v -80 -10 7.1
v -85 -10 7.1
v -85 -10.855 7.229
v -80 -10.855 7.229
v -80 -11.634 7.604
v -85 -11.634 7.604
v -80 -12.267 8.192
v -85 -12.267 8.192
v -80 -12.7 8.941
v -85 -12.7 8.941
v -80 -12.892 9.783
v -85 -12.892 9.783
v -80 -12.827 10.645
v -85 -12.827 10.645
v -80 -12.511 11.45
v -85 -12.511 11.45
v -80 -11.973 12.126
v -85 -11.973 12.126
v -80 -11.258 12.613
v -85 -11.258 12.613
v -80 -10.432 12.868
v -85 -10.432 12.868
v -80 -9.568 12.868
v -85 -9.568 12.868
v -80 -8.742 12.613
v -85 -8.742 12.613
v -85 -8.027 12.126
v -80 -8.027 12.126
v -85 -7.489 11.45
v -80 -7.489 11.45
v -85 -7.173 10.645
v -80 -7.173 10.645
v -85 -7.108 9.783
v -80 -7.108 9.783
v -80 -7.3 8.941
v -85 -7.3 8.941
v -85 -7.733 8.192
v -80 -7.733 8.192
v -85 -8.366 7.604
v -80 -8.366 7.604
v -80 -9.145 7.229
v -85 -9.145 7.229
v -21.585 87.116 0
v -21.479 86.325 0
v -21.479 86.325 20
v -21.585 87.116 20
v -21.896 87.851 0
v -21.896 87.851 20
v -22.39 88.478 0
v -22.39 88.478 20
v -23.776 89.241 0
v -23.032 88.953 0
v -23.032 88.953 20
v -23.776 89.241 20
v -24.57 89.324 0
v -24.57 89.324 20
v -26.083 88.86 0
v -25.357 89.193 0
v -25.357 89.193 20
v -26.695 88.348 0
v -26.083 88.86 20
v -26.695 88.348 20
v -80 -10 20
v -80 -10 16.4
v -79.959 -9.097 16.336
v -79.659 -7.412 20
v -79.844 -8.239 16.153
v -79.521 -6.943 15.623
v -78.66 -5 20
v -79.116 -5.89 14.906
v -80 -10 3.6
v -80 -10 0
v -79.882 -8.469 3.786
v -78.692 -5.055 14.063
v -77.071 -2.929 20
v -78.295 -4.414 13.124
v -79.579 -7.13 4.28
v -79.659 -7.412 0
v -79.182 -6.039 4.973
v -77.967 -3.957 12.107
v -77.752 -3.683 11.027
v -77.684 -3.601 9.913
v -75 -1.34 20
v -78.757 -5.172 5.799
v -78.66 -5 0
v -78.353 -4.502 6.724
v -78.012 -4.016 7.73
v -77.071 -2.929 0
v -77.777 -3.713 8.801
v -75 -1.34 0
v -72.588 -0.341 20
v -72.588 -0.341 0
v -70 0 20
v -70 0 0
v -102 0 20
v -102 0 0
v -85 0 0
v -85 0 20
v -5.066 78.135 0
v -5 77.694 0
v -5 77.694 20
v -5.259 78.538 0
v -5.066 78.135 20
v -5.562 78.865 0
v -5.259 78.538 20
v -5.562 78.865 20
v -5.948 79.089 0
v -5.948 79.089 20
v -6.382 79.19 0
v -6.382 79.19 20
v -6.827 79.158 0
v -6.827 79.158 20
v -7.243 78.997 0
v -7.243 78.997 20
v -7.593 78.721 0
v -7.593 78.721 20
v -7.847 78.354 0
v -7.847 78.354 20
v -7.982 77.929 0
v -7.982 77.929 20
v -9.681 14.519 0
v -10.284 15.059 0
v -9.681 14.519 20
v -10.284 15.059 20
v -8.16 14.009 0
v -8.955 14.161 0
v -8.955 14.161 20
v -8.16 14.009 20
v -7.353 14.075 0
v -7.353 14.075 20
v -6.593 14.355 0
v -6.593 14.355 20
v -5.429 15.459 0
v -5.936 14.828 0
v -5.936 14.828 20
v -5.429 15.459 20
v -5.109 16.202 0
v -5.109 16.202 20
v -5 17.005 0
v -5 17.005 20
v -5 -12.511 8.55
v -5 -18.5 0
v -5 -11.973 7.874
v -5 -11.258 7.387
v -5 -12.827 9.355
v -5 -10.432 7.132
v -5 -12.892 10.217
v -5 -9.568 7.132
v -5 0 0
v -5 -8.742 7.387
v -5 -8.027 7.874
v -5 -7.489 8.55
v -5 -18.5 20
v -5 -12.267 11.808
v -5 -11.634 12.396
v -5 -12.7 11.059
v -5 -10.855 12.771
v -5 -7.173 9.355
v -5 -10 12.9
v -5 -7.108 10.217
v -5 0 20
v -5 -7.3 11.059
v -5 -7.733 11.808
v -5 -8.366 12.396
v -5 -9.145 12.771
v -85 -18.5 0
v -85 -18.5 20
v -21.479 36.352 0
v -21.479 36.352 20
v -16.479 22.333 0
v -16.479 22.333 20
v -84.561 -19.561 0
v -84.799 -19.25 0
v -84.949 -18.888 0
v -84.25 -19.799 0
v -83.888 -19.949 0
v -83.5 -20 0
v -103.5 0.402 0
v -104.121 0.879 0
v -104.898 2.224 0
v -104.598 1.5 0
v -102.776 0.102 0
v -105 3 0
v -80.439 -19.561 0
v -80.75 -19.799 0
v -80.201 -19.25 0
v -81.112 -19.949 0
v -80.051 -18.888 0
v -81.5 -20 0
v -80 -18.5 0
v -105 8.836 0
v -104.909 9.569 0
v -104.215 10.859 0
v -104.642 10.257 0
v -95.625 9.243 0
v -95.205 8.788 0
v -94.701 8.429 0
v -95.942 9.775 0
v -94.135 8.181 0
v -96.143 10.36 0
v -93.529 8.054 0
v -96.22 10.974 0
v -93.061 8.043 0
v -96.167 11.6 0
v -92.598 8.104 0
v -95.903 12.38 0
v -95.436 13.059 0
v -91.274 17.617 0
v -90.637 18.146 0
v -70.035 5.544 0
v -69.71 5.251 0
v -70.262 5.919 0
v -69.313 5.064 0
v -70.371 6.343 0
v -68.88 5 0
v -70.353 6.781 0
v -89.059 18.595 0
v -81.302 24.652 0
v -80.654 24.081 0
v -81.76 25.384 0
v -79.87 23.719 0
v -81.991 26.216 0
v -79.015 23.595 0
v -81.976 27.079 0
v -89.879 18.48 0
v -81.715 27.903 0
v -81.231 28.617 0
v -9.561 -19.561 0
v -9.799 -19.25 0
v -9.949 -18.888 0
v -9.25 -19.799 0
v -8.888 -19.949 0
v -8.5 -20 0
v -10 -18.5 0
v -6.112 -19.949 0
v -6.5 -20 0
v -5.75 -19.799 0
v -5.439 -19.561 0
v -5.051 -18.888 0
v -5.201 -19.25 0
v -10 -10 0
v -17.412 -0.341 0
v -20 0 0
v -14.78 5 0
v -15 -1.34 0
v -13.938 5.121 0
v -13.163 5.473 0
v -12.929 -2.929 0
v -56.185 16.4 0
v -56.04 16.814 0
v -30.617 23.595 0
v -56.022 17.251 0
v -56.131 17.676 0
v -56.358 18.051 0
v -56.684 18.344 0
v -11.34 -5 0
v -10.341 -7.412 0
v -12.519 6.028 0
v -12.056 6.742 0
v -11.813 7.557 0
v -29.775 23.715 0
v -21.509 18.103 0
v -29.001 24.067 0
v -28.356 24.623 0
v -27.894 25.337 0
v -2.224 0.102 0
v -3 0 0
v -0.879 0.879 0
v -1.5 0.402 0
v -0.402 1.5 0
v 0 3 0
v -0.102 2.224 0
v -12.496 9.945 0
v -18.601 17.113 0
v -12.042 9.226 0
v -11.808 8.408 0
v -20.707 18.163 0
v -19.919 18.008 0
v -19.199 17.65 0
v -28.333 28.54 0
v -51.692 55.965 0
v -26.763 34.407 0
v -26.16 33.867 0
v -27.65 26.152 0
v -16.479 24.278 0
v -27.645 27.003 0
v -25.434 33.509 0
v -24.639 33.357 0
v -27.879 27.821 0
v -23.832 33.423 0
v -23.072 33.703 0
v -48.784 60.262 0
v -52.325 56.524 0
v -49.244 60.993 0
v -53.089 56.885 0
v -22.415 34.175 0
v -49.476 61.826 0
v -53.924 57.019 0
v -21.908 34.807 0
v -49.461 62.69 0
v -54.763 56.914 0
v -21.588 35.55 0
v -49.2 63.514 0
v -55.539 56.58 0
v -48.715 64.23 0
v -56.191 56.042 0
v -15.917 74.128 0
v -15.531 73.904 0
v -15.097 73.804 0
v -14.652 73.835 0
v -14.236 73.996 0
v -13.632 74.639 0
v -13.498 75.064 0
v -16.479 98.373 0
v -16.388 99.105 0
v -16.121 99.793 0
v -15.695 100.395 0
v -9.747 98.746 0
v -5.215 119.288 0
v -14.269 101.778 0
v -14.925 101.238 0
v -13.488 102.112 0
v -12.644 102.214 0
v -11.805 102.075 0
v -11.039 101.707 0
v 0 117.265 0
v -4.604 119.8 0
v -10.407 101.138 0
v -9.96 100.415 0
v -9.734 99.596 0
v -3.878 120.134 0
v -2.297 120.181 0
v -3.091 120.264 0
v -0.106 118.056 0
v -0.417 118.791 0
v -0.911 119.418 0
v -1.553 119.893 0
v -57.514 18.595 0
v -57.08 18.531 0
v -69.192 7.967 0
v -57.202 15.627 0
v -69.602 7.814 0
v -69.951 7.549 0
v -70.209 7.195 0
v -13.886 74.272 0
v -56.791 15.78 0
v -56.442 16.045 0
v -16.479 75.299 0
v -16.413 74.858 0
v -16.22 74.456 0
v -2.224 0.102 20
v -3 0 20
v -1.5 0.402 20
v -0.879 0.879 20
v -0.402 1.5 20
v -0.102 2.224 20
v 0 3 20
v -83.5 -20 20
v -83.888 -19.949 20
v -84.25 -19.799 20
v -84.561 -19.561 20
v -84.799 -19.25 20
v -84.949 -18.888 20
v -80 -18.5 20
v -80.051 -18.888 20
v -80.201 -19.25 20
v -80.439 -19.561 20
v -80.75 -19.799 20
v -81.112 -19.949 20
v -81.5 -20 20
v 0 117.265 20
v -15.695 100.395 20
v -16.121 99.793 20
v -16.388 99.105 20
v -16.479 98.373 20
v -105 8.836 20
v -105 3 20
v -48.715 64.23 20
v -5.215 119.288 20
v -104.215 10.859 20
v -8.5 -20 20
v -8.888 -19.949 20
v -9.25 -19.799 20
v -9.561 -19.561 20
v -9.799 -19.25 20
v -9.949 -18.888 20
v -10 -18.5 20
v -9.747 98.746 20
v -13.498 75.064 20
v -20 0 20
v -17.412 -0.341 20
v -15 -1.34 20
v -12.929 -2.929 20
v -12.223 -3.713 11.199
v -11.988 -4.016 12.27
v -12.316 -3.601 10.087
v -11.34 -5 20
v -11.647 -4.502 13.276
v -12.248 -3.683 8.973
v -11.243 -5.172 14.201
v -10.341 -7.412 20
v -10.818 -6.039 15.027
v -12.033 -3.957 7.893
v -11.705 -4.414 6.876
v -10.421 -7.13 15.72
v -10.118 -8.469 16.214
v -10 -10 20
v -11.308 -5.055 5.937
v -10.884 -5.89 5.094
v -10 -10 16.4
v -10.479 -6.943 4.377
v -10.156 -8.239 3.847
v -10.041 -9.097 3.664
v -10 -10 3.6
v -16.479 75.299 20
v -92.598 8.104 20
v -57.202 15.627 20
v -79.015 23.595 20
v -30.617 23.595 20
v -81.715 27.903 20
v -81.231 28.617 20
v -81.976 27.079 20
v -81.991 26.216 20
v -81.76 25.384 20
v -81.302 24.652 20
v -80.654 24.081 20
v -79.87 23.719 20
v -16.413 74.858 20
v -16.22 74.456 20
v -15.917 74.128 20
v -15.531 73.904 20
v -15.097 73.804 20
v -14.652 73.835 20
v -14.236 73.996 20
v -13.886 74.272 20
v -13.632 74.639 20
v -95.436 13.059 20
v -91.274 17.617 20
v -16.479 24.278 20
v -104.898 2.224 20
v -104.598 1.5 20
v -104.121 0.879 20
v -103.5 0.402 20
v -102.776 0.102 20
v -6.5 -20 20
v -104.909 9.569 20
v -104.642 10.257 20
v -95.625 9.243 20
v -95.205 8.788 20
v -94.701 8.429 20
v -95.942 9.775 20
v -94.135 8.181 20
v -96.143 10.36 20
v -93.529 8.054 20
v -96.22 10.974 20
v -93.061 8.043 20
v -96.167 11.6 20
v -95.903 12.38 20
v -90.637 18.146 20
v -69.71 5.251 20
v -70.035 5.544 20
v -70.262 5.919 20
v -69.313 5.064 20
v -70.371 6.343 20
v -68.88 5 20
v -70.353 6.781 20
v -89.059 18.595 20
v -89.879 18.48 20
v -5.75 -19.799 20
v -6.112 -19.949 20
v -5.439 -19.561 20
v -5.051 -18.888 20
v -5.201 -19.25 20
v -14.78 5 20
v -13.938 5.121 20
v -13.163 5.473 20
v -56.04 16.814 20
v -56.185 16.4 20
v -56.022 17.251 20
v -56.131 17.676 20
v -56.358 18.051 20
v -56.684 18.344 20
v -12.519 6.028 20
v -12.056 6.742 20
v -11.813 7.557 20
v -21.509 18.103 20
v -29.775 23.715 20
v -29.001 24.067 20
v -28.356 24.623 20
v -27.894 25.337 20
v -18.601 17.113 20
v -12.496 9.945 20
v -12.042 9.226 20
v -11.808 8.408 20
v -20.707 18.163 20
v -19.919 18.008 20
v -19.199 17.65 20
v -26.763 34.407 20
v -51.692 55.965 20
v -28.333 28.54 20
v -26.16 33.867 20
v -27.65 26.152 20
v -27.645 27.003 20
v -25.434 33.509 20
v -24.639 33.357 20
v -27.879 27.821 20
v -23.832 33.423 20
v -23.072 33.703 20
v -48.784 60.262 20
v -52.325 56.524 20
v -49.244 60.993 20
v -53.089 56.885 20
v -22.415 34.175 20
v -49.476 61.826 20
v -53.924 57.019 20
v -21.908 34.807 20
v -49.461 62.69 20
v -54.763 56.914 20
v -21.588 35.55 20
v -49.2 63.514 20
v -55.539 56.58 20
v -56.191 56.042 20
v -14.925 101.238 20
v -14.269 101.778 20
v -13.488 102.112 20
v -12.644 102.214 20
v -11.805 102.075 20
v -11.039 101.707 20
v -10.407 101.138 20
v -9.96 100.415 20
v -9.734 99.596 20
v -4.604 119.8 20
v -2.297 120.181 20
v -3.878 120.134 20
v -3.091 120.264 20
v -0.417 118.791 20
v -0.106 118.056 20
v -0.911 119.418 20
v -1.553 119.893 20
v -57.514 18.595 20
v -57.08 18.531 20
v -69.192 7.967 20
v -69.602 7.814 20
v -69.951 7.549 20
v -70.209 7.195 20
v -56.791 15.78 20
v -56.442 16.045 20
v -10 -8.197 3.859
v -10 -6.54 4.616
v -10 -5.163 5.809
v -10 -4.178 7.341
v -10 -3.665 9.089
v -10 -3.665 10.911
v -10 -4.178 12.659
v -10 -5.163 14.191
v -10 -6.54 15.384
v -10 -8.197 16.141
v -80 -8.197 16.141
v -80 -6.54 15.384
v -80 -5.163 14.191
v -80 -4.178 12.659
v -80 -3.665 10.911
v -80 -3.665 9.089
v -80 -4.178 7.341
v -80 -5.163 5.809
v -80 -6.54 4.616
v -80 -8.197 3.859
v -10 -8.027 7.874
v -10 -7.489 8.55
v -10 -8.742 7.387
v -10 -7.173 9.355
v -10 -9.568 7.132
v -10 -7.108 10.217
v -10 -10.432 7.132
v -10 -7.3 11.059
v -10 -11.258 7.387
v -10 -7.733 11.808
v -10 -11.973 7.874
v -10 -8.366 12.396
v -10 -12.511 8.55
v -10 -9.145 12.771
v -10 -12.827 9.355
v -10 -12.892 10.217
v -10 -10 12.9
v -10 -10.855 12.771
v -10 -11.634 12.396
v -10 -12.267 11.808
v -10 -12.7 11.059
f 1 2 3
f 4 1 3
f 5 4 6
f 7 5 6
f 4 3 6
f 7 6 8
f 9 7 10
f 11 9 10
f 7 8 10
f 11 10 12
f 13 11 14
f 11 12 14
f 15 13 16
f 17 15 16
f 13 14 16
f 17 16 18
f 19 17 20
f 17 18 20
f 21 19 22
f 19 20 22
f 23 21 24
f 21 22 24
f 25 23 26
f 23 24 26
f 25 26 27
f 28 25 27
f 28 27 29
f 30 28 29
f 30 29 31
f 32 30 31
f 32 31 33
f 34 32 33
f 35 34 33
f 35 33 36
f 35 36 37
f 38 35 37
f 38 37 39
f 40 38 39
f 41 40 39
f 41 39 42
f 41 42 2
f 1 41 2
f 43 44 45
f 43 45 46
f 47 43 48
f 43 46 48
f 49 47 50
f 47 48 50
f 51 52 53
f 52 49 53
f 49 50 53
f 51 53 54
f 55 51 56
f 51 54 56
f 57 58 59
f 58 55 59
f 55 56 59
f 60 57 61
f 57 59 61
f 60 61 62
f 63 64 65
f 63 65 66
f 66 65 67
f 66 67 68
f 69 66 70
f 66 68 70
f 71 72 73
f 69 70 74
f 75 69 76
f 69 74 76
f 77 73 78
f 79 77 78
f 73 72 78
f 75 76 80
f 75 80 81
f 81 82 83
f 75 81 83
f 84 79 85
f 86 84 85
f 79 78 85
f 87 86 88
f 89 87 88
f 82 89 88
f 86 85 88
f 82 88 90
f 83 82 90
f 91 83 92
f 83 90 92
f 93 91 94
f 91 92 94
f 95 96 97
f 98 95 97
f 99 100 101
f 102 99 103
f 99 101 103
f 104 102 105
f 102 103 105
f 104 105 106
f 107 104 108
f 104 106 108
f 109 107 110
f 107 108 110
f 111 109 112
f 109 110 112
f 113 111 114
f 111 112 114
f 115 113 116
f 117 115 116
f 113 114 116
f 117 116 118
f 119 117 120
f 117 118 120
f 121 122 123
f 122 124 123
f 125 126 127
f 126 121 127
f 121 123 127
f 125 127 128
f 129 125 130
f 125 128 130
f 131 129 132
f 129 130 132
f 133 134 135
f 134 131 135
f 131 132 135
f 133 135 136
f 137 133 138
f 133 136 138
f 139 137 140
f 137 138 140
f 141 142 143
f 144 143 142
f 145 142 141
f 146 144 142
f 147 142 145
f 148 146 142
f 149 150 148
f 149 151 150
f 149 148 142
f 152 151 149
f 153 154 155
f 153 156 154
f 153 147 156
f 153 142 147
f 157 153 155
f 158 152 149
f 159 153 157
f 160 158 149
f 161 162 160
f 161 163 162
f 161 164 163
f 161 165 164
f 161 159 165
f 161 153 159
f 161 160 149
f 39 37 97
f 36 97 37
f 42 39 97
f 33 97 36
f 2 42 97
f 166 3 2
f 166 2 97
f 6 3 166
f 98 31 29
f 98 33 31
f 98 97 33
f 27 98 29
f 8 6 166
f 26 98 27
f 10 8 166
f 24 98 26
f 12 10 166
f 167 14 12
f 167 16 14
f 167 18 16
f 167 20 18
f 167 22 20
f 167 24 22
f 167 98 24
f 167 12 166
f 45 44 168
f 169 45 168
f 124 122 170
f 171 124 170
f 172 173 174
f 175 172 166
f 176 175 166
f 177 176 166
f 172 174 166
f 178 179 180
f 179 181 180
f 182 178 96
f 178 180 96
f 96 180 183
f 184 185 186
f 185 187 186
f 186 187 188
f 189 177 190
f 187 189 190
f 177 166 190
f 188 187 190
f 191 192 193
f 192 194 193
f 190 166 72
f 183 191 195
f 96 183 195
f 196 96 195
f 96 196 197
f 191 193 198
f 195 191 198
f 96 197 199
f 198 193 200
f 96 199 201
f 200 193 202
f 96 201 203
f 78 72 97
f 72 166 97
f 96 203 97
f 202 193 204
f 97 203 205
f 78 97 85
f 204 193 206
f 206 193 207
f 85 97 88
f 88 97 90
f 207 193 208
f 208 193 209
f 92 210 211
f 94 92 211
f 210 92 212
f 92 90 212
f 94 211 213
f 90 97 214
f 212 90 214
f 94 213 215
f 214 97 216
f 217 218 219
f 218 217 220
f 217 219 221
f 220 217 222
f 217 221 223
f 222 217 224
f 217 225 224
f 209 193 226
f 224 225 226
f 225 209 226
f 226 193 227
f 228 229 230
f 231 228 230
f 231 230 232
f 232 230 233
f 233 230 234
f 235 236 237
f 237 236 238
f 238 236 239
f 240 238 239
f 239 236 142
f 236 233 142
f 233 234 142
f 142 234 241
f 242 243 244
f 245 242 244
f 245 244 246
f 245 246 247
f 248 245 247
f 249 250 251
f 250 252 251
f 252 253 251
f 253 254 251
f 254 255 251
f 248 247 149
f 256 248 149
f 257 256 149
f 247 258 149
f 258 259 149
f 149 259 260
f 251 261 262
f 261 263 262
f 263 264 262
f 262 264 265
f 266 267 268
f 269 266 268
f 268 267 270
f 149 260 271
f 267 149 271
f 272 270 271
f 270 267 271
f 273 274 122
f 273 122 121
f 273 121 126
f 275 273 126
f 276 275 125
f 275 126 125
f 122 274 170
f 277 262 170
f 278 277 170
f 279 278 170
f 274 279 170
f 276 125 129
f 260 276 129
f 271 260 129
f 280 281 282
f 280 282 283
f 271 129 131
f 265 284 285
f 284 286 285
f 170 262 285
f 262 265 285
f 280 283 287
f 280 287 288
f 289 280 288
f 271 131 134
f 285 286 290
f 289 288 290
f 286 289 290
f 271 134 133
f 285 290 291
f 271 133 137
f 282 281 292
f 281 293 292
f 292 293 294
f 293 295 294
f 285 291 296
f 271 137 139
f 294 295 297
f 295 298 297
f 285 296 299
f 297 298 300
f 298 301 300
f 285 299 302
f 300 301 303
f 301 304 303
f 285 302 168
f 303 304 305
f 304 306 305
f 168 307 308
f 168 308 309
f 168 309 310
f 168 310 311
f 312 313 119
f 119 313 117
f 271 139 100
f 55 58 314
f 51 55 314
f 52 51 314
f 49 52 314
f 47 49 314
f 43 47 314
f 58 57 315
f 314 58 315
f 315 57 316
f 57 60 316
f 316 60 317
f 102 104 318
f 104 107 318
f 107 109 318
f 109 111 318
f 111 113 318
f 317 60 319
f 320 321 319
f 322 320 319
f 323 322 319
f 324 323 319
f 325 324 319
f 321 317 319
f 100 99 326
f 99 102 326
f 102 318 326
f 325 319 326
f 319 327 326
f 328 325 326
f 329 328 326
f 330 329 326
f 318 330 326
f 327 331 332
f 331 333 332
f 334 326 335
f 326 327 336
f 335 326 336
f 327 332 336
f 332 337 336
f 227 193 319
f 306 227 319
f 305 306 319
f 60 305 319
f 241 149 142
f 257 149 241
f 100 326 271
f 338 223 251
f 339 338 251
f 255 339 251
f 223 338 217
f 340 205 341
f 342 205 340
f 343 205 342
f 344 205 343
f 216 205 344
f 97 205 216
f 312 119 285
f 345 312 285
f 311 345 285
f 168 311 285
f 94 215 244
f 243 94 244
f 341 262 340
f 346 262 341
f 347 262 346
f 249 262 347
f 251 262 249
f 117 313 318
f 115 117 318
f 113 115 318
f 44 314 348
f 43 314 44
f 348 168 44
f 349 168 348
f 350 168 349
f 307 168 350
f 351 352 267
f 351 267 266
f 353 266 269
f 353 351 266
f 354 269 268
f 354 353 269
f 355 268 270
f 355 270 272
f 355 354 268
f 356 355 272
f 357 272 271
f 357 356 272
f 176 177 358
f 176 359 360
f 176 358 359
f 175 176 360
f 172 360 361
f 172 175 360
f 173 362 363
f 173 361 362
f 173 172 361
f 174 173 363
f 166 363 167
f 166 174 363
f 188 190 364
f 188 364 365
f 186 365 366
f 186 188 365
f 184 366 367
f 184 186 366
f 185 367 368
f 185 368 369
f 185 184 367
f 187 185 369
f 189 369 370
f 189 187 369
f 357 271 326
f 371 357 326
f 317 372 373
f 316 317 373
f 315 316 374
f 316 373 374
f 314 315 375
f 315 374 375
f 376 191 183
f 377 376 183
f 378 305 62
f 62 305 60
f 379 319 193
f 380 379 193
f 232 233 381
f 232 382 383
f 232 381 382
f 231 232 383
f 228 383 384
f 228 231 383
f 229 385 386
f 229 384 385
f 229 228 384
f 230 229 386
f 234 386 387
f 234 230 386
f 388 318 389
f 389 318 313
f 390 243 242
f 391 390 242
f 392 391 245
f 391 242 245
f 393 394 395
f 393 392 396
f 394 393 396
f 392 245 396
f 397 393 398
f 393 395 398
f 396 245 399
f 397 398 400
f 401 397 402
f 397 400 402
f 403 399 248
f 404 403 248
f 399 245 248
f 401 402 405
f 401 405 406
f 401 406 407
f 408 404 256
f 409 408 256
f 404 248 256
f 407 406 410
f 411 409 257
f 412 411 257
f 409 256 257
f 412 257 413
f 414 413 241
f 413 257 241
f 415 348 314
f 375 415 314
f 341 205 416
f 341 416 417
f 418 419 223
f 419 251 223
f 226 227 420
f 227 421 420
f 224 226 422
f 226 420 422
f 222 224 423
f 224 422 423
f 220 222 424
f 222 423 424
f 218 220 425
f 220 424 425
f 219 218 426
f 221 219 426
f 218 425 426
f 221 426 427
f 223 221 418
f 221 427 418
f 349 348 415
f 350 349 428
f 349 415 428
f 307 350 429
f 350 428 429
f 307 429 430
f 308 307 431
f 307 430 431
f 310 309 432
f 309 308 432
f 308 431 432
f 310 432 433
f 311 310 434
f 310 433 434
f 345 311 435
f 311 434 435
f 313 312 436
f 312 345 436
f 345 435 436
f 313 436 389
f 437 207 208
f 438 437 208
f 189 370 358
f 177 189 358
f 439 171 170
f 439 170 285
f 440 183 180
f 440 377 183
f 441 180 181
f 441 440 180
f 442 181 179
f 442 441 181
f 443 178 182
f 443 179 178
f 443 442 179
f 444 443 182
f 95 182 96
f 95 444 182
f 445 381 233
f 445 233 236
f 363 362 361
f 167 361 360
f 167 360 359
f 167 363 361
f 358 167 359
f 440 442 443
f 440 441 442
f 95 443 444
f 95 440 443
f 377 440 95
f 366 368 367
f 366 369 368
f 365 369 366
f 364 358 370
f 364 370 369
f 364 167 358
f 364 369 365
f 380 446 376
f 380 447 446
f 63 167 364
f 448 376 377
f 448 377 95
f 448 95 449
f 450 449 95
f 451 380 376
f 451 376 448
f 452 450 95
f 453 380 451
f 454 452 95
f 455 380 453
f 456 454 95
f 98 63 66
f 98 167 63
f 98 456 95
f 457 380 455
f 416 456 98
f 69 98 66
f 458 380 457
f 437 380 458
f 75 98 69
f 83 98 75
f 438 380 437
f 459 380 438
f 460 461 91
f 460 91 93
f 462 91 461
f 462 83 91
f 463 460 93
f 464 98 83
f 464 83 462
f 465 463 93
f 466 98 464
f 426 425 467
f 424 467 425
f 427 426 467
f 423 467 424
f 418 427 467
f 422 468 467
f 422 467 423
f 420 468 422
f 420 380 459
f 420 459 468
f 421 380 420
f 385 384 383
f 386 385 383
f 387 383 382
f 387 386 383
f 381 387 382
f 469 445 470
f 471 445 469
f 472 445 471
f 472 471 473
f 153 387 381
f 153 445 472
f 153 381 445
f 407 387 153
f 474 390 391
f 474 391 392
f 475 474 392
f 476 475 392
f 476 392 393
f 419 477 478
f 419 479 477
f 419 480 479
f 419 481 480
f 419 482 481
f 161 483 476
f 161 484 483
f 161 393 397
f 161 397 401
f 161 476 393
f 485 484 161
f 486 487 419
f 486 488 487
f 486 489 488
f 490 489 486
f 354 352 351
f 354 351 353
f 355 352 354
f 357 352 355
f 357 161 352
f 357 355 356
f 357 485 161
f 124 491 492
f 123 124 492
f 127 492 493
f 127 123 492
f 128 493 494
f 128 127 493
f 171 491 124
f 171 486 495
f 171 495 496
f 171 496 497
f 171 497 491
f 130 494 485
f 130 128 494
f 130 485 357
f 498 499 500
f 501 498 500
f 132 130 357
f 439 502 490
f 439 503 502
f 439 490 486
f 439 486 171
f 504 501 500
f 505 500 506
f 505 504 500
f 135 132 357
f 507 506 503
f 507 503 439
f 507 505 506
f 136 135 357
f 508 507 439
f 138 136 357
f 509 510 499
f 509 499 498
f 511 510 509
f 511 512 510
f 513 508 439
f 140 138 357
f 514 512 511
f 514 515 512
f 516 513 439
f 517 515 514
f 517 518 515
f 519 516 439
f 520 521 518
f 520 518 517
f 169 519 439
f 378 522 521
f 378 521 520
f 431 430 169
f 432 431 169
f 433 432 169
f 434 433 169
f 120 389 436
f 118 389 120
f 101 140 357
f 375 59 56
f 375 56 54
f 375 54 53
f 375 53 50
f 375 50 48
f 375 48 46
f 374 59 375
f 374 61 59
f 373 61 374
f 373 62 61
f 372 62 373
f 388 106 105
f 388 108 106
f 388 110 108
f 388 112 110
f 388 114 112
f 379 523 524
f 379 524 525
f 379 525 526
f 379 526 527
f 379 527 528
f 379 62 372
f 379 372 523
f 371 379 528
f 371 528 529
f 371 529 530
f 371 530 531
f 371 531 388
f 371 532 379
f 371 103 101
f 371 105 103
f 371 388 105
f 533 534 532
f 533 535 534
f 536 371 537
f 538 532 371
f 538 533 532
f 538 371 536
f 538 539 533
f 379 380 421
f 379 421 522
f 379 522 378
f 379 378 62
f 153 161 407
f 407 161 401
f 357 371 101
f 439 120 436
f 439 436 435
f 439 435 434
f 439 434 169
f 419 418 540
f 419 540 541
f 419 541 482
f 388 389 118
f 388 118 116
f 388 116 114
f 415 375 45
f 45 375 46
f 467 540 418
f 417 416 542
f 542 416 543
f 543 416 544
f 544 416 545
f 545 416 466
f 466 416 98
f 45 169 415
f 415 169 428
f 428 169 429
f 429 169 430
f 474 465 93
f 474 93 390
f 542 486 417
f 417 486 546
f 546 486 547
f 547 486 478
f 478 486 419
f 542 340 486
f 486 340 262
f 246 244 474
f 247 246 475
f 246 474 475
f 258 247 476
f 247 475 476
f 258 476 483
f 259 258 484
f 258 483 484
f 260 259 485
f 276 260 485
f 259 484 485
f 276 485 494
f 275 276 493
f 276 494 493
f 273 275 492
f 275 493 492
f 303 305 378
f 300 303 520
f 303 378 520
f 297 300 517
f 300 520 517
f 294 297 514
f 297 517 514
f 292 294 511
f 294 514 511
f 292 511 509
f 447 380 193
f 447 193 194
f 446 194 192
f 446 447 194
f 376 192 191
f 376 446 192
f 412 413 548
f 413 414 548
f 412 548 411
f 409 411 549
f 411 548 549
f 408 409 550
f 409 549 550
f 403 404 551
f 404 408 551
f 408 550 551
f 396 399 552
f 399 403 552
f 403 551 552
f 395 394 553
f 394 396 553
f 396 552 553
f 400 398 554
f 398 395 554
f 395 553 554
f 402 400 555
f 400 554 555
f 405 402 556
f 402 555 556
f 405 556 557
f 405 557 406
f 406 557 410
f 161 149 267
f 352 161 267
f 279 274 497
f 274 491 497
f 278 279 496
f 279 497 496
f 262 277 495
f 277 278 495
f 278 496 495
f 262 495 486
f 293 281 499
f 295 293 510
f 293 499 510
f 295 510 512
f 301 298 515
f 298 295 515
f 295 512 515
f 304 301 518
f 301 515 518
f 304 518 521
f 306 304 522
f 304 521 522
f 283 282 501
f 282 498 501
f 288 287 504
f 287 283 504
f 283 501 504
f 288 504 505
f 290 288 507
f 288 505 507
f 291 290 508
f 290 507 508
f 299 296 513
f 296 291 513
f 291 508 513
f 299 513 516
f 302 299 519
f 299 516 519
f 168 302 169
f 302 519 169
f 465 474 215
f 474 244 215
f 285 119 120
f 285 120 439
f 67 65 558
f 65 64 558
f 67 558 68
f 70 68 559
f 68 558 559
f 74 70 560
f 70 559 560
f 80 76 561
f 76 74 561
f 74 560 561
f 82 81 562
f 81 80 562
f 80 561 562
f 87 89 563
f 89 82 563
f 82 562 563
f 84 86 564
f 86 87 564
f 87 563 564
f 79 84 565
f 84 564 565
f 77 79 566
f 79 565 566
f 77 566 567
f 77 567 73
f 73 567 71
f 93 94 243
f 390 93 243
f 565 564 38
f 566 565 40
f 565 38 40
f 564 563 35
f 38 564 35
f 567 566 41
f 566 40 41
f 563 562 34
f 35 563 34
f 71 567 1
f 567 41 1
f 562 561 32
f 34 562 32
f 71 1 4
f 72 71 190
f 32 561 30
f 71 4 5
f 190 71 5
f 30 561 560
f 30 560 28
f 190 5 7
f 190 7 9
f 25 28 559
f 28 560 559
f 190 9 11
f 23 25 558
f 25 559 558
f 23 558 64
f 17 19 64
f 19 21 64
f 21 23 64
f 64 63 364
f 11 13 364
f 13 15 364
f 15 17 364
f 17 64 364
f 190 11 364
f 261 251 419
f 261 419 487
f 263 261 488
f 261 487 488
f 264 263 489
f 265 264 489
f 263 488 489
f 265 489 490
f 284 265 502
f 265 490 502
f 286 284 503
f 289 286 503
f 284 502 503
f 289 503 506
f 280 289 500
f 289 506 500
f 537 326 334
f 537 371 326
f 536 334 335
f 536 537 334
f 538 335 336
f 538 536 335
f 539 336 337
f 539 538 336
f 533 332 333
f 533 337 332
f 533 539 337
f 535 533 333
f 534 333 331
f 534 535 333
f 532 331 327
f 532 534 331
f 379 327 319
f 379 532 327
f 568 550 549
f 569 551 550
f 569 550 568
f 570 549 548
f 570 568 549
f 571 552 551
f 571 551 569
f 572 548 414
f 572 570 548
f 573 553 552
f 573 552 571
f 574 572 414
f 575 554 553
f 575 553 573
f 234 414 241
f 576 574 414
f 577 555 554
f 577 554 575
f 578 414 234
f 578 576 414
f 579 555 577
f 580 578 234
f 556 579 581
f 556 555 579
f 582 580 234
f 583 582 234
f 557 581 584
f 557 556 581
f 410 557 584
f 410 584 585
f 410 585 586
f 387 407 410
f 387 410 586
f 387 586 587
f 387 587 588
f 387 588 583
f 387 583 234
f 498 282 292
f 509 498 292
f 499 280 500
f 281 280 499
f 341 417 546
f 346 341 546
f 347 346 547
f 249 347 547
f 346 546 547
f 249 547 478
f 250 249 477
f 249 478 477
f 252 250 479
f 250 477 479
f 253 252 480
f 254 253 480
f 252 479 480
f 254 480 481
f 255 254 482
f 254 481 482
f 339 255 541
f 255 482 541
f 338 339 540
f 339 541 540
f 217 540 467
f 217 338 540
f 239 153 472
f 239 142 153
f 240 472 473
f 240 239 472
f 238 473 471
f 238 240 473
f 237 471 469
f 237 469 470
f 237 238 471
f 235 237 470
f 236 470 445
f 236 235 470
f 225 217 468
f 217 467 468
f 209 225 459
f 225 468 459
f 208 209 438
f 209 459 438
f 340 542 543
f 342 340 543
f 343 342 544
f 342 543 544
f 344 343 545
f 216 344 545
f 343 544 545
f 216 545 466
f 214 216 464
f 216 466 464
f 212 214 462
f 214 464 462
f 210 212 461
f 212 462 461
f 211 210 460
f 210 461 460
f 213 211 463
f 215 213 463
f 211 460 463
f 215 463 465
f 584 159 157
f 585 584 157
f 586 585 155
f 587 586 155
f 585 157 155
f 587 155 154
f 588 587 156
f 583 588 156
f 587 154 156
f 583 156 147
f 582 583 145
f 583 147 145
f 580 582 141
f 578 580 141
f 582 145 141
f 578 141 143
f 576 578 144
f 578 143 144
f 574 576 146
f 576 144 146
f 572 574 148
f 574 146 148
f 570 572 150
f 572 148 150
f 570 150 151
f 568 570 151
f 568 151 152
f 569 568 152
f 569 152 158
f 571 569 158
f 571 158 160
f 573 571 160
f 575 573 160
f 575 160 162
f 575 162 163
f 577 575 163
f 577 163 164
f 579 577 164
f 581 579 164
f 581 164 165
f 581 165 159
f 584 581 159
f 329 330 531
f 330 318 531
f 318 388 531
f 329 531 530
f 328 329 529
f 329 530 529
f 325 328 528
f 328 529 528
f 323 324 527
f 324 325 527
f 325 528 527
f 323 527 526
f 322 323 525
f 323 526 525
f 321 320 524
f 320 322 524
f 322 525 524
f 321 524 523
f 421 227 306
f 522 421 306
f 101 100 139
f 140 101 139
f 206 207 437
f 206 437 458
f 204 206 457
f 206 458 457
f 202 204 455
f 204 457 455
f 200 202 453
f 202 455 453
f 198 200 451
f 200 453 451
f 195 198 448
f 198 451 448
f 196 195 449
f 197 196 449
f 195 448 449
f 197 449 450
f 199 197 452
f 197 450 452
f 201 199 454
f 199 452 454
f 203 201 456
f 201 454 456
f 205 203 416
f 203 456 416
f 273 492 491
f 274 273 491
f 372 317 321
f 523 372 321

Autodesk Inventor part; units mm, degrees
ref_plane "YZ Plane" through (0, 0, 0) normal (1, 0, 0) x (0, 1, 0)
ref_plane "XZ Plane" through (0, 0, 0) normal (0, 1, 0) x (-1, 0, 0)
ref_plane "XY Plane" through (0, 0, 0) normal (0, 0, 1) x (1, 0, 0)
sketch "Sketch1" plane through (0, 0, 0) normal (0, 0, 1) x (1, 0, 0)
  line L0 (0, 0) -> (0, 125)
  line L1 (0, 125) -> (-105, 10)
  line L2 (-105, 10) -> (-105, 0)
  line L3 (-105, 0) -> (0, 0)
  line L4 (-100, 8.0608) -> (-5, 112.1084)
  line L5 (-5, 112.1084) -> (-5, 5)
  line L6 (-5, 5) -> (-100, 5)
  line L7 (-100, 5) -> (-100, 8.0608)
  point P0 (-52.5, 62.5)
  point P1 (-52.5, 0)
  point P2 (0, 62.5)
  dimension "d0" = 10
  dimension "d1" = 105
  dimension "d2" = 125
  dimension "d3" = 5
extrude "Extrusion1" add sketch "Sketch1" along normal blind 20
sketch "Sketch2" plane through (0, 0, 0) normal (0, 0, -1) x (-1, 0, 0)
  line L0 (5, 112.1084) -> (5, 5) projected
  line L1 (5, 8.8556) -> (50.4993, 62.2758)
  line L2 (100, 8.0608) -> (5, 112.1084) projected
  line L3 (5, 5) -> (100, 5) projected
  line L4 (8.2839, 5) -> (53.8973, 58.5542)
  line L5 (16.4791, 22.3331) -> (16.4791, 99.536)
  line L6 (21.4791, 94.0598) -> (21.4791, 28.2035)
  line L7 (24.1213, 23.5946) -> (85.817, 23.5946)
  line L8 (19.8627, 18.5946) -> (90.3822, 18.5946)
  line L9 (100, 5) -> (100, 8.0608) projected
  line L10 (100, 6.5304) -> (23.4466, 22.8023)
  line L11 (83.1512, 5) -> (19.7602, 18.4742)
  line L12 (8.1824, 108.6229) -> (21.0073, 27.6496)
  line L13 (5, 96.7537) -> (16.7388, 22.6379)
  point P0 (0, 0)
  point P1 (16.4791, 56.2397)
  point P2 (43.2425, 18.5946)
  point P3 (16.4791, 24.2774)
  dimension "d8" = 2.5
  dimension "d9" = 2.5
  dimension "d10" = 5
  dimension "d11" = 5
  dimension "d16" = 5
  dimension "d17" = 12
  dimension "d18" = 5
  dimension "d19" = 9
extrude "Extrusion2" add sketch "Sketch2" against normal blind 20 contours L2 L12 L5 L13 L0 | L1 L2 L4 L3 L0 | L13 L1 L5 | L5 L12 L1 L13 | L2 L6 L1 L12 L5 | L11 L4 L8 L10 L9 L3 | L4 L10 L8 | L2 L8 L10 L4 L7
fillet "Fillet1" radius 3 18 edges at (-90.3822, 18.5946, 10) (-53.8973, 58.5542, 10) (-85.817, 23.5946, 10) (-24.1213, 23.5946, 10) (-50.4993, 62.2758, 10) (-21.4791, 94.0598, 10) (-16.4791, 99.536, 10) (-21.4791, 28.2035, 10) (0, 0, 10) (-5, 8.8556, 10) (-8.2839, 5, 10) (-105, 0, 10) (-100, 8.0608, 10) (-105, 10, 10) (0, 125, 10) (-19.7602, 18.4742, 10) (-100, 6.5304, 10) (-8.1824, 108.6229, 10)
fillet "Fillet2" radius 1.5 4 edges at (-16.4791, 56.2397, 10) (-43.2425, 18.5946, 10) (-5, 96.7537, 10) (-83.1512, 5, 10)
sketch "Sketch5" plane through (0, 0, 20) normal (0, 0, 1) x (1, 0, 0)
  line L0 (-102, 0) -> (-3, 0) projected
  line L1 (-85, 0) -> (-85, -20)
  line L2 (-80, 0) -> (-80, -20)
  line L3 (-80, -20) -> (-85, -20)
  line L4 (-10, 0) -> (-10, -20)
  line L5 (-10, -20) -> (-5, -20)
  line L6 (-5, -20) -> (-5, 0)
  line L7 (-105, 8.8365) -> (-105, 3) projected
  point P0 (0, 0)
  dimension "d35" = 5
  dimension "d36" = 20
  dimension "d37" = 80
  dimension "d38" = 5
  dimension "d52" = 20
extrude "Extrusion3" add sketch "Sketch5" against normal up to surface (20 mm away)
fillet "Fillet3" radius 1.5 4 edges at (-80, -20, 10) (-85, -20, 10) (-10, -20, 10) (-5, -20, 10)
fillet "Fillet4" radius 10 2 edges at (-80, 0, 10) (-10, 0, 10)
sketch "Sketch6" plane through (-10, -18.5, 0) normal (-1, 0, 0) x (0, 0, 1)
  line L0 (0, -1.5) -> (20, -1.5) projected
  line L1 (0, 0) -> (0, 8.5) projected
  point P0 (0, 18.5)
  point P1 (10, 8.5)
  dimension "d50" = 10
  dimension "d51" = 10
hole "Hole2" at (-10, -10, 10) direction (1, 0, 0) diameter 5.8 end through all clearance for "Flat Head Machine Screw" size "M5" standard "Ansi Metric M Profile"
sketch "Sketch7" plane through (-10, -18.5, 0) normal (-1, 0, 0) x (0, 0, 1)
  arc A0 (12.9, 8.5) -> (7.1, 8.5) centre (10, 8.5) ccw projected
  circle A1 centre (10, 8.5) radius 6.4
  arc A2 (7.1, 8.5) -> (12.9, 8.5) centre (10, 8.5) ccw projected
  point P0 (0, 18.5)
  dimension "d53" = 3.5
extrude "Extrusion4" cut sketch "Sketch7" along normal blind 10 contours A2 A0 | A1
sketch "Sketch8" plane through (-80, -18.5, 20) normal (1, 0, 0) x (0, 0, -1)
  line L0 (20, 8.5) -> (20, 0) projected
  line L1 (0, -1.5) -> (20, -1.5) projected
  point P0 (20, 18.5)
  point P1 (10, 8.5)
  dimension "d63" = 10
  dimension "d64" = 10
hole "Hole3" at (-80, -10, 10) direction (-1, 0, 0) diameter 5.8 end through all clearance for "Flat Head Machine Screw" size "M5" standard "Ansi Metric M Profile"
sketch "Sketch9" plane through (-80, -18.5, 20) normal (1, 0, 0) x (0, 0, -1)
  line L0 (7.1, 8.5) -> (12.9, 8.5) projected
  circle A0 centre (10, 8.5) radius 6.4
  point P0 (20, 18.5)
extrude "Extrusion5" cut sketch "Sketch9" along normal blind 10
equation "\"d9\" = d8"
equation "\"d35\" = d38"
properties part number "Controls Mid Support"
